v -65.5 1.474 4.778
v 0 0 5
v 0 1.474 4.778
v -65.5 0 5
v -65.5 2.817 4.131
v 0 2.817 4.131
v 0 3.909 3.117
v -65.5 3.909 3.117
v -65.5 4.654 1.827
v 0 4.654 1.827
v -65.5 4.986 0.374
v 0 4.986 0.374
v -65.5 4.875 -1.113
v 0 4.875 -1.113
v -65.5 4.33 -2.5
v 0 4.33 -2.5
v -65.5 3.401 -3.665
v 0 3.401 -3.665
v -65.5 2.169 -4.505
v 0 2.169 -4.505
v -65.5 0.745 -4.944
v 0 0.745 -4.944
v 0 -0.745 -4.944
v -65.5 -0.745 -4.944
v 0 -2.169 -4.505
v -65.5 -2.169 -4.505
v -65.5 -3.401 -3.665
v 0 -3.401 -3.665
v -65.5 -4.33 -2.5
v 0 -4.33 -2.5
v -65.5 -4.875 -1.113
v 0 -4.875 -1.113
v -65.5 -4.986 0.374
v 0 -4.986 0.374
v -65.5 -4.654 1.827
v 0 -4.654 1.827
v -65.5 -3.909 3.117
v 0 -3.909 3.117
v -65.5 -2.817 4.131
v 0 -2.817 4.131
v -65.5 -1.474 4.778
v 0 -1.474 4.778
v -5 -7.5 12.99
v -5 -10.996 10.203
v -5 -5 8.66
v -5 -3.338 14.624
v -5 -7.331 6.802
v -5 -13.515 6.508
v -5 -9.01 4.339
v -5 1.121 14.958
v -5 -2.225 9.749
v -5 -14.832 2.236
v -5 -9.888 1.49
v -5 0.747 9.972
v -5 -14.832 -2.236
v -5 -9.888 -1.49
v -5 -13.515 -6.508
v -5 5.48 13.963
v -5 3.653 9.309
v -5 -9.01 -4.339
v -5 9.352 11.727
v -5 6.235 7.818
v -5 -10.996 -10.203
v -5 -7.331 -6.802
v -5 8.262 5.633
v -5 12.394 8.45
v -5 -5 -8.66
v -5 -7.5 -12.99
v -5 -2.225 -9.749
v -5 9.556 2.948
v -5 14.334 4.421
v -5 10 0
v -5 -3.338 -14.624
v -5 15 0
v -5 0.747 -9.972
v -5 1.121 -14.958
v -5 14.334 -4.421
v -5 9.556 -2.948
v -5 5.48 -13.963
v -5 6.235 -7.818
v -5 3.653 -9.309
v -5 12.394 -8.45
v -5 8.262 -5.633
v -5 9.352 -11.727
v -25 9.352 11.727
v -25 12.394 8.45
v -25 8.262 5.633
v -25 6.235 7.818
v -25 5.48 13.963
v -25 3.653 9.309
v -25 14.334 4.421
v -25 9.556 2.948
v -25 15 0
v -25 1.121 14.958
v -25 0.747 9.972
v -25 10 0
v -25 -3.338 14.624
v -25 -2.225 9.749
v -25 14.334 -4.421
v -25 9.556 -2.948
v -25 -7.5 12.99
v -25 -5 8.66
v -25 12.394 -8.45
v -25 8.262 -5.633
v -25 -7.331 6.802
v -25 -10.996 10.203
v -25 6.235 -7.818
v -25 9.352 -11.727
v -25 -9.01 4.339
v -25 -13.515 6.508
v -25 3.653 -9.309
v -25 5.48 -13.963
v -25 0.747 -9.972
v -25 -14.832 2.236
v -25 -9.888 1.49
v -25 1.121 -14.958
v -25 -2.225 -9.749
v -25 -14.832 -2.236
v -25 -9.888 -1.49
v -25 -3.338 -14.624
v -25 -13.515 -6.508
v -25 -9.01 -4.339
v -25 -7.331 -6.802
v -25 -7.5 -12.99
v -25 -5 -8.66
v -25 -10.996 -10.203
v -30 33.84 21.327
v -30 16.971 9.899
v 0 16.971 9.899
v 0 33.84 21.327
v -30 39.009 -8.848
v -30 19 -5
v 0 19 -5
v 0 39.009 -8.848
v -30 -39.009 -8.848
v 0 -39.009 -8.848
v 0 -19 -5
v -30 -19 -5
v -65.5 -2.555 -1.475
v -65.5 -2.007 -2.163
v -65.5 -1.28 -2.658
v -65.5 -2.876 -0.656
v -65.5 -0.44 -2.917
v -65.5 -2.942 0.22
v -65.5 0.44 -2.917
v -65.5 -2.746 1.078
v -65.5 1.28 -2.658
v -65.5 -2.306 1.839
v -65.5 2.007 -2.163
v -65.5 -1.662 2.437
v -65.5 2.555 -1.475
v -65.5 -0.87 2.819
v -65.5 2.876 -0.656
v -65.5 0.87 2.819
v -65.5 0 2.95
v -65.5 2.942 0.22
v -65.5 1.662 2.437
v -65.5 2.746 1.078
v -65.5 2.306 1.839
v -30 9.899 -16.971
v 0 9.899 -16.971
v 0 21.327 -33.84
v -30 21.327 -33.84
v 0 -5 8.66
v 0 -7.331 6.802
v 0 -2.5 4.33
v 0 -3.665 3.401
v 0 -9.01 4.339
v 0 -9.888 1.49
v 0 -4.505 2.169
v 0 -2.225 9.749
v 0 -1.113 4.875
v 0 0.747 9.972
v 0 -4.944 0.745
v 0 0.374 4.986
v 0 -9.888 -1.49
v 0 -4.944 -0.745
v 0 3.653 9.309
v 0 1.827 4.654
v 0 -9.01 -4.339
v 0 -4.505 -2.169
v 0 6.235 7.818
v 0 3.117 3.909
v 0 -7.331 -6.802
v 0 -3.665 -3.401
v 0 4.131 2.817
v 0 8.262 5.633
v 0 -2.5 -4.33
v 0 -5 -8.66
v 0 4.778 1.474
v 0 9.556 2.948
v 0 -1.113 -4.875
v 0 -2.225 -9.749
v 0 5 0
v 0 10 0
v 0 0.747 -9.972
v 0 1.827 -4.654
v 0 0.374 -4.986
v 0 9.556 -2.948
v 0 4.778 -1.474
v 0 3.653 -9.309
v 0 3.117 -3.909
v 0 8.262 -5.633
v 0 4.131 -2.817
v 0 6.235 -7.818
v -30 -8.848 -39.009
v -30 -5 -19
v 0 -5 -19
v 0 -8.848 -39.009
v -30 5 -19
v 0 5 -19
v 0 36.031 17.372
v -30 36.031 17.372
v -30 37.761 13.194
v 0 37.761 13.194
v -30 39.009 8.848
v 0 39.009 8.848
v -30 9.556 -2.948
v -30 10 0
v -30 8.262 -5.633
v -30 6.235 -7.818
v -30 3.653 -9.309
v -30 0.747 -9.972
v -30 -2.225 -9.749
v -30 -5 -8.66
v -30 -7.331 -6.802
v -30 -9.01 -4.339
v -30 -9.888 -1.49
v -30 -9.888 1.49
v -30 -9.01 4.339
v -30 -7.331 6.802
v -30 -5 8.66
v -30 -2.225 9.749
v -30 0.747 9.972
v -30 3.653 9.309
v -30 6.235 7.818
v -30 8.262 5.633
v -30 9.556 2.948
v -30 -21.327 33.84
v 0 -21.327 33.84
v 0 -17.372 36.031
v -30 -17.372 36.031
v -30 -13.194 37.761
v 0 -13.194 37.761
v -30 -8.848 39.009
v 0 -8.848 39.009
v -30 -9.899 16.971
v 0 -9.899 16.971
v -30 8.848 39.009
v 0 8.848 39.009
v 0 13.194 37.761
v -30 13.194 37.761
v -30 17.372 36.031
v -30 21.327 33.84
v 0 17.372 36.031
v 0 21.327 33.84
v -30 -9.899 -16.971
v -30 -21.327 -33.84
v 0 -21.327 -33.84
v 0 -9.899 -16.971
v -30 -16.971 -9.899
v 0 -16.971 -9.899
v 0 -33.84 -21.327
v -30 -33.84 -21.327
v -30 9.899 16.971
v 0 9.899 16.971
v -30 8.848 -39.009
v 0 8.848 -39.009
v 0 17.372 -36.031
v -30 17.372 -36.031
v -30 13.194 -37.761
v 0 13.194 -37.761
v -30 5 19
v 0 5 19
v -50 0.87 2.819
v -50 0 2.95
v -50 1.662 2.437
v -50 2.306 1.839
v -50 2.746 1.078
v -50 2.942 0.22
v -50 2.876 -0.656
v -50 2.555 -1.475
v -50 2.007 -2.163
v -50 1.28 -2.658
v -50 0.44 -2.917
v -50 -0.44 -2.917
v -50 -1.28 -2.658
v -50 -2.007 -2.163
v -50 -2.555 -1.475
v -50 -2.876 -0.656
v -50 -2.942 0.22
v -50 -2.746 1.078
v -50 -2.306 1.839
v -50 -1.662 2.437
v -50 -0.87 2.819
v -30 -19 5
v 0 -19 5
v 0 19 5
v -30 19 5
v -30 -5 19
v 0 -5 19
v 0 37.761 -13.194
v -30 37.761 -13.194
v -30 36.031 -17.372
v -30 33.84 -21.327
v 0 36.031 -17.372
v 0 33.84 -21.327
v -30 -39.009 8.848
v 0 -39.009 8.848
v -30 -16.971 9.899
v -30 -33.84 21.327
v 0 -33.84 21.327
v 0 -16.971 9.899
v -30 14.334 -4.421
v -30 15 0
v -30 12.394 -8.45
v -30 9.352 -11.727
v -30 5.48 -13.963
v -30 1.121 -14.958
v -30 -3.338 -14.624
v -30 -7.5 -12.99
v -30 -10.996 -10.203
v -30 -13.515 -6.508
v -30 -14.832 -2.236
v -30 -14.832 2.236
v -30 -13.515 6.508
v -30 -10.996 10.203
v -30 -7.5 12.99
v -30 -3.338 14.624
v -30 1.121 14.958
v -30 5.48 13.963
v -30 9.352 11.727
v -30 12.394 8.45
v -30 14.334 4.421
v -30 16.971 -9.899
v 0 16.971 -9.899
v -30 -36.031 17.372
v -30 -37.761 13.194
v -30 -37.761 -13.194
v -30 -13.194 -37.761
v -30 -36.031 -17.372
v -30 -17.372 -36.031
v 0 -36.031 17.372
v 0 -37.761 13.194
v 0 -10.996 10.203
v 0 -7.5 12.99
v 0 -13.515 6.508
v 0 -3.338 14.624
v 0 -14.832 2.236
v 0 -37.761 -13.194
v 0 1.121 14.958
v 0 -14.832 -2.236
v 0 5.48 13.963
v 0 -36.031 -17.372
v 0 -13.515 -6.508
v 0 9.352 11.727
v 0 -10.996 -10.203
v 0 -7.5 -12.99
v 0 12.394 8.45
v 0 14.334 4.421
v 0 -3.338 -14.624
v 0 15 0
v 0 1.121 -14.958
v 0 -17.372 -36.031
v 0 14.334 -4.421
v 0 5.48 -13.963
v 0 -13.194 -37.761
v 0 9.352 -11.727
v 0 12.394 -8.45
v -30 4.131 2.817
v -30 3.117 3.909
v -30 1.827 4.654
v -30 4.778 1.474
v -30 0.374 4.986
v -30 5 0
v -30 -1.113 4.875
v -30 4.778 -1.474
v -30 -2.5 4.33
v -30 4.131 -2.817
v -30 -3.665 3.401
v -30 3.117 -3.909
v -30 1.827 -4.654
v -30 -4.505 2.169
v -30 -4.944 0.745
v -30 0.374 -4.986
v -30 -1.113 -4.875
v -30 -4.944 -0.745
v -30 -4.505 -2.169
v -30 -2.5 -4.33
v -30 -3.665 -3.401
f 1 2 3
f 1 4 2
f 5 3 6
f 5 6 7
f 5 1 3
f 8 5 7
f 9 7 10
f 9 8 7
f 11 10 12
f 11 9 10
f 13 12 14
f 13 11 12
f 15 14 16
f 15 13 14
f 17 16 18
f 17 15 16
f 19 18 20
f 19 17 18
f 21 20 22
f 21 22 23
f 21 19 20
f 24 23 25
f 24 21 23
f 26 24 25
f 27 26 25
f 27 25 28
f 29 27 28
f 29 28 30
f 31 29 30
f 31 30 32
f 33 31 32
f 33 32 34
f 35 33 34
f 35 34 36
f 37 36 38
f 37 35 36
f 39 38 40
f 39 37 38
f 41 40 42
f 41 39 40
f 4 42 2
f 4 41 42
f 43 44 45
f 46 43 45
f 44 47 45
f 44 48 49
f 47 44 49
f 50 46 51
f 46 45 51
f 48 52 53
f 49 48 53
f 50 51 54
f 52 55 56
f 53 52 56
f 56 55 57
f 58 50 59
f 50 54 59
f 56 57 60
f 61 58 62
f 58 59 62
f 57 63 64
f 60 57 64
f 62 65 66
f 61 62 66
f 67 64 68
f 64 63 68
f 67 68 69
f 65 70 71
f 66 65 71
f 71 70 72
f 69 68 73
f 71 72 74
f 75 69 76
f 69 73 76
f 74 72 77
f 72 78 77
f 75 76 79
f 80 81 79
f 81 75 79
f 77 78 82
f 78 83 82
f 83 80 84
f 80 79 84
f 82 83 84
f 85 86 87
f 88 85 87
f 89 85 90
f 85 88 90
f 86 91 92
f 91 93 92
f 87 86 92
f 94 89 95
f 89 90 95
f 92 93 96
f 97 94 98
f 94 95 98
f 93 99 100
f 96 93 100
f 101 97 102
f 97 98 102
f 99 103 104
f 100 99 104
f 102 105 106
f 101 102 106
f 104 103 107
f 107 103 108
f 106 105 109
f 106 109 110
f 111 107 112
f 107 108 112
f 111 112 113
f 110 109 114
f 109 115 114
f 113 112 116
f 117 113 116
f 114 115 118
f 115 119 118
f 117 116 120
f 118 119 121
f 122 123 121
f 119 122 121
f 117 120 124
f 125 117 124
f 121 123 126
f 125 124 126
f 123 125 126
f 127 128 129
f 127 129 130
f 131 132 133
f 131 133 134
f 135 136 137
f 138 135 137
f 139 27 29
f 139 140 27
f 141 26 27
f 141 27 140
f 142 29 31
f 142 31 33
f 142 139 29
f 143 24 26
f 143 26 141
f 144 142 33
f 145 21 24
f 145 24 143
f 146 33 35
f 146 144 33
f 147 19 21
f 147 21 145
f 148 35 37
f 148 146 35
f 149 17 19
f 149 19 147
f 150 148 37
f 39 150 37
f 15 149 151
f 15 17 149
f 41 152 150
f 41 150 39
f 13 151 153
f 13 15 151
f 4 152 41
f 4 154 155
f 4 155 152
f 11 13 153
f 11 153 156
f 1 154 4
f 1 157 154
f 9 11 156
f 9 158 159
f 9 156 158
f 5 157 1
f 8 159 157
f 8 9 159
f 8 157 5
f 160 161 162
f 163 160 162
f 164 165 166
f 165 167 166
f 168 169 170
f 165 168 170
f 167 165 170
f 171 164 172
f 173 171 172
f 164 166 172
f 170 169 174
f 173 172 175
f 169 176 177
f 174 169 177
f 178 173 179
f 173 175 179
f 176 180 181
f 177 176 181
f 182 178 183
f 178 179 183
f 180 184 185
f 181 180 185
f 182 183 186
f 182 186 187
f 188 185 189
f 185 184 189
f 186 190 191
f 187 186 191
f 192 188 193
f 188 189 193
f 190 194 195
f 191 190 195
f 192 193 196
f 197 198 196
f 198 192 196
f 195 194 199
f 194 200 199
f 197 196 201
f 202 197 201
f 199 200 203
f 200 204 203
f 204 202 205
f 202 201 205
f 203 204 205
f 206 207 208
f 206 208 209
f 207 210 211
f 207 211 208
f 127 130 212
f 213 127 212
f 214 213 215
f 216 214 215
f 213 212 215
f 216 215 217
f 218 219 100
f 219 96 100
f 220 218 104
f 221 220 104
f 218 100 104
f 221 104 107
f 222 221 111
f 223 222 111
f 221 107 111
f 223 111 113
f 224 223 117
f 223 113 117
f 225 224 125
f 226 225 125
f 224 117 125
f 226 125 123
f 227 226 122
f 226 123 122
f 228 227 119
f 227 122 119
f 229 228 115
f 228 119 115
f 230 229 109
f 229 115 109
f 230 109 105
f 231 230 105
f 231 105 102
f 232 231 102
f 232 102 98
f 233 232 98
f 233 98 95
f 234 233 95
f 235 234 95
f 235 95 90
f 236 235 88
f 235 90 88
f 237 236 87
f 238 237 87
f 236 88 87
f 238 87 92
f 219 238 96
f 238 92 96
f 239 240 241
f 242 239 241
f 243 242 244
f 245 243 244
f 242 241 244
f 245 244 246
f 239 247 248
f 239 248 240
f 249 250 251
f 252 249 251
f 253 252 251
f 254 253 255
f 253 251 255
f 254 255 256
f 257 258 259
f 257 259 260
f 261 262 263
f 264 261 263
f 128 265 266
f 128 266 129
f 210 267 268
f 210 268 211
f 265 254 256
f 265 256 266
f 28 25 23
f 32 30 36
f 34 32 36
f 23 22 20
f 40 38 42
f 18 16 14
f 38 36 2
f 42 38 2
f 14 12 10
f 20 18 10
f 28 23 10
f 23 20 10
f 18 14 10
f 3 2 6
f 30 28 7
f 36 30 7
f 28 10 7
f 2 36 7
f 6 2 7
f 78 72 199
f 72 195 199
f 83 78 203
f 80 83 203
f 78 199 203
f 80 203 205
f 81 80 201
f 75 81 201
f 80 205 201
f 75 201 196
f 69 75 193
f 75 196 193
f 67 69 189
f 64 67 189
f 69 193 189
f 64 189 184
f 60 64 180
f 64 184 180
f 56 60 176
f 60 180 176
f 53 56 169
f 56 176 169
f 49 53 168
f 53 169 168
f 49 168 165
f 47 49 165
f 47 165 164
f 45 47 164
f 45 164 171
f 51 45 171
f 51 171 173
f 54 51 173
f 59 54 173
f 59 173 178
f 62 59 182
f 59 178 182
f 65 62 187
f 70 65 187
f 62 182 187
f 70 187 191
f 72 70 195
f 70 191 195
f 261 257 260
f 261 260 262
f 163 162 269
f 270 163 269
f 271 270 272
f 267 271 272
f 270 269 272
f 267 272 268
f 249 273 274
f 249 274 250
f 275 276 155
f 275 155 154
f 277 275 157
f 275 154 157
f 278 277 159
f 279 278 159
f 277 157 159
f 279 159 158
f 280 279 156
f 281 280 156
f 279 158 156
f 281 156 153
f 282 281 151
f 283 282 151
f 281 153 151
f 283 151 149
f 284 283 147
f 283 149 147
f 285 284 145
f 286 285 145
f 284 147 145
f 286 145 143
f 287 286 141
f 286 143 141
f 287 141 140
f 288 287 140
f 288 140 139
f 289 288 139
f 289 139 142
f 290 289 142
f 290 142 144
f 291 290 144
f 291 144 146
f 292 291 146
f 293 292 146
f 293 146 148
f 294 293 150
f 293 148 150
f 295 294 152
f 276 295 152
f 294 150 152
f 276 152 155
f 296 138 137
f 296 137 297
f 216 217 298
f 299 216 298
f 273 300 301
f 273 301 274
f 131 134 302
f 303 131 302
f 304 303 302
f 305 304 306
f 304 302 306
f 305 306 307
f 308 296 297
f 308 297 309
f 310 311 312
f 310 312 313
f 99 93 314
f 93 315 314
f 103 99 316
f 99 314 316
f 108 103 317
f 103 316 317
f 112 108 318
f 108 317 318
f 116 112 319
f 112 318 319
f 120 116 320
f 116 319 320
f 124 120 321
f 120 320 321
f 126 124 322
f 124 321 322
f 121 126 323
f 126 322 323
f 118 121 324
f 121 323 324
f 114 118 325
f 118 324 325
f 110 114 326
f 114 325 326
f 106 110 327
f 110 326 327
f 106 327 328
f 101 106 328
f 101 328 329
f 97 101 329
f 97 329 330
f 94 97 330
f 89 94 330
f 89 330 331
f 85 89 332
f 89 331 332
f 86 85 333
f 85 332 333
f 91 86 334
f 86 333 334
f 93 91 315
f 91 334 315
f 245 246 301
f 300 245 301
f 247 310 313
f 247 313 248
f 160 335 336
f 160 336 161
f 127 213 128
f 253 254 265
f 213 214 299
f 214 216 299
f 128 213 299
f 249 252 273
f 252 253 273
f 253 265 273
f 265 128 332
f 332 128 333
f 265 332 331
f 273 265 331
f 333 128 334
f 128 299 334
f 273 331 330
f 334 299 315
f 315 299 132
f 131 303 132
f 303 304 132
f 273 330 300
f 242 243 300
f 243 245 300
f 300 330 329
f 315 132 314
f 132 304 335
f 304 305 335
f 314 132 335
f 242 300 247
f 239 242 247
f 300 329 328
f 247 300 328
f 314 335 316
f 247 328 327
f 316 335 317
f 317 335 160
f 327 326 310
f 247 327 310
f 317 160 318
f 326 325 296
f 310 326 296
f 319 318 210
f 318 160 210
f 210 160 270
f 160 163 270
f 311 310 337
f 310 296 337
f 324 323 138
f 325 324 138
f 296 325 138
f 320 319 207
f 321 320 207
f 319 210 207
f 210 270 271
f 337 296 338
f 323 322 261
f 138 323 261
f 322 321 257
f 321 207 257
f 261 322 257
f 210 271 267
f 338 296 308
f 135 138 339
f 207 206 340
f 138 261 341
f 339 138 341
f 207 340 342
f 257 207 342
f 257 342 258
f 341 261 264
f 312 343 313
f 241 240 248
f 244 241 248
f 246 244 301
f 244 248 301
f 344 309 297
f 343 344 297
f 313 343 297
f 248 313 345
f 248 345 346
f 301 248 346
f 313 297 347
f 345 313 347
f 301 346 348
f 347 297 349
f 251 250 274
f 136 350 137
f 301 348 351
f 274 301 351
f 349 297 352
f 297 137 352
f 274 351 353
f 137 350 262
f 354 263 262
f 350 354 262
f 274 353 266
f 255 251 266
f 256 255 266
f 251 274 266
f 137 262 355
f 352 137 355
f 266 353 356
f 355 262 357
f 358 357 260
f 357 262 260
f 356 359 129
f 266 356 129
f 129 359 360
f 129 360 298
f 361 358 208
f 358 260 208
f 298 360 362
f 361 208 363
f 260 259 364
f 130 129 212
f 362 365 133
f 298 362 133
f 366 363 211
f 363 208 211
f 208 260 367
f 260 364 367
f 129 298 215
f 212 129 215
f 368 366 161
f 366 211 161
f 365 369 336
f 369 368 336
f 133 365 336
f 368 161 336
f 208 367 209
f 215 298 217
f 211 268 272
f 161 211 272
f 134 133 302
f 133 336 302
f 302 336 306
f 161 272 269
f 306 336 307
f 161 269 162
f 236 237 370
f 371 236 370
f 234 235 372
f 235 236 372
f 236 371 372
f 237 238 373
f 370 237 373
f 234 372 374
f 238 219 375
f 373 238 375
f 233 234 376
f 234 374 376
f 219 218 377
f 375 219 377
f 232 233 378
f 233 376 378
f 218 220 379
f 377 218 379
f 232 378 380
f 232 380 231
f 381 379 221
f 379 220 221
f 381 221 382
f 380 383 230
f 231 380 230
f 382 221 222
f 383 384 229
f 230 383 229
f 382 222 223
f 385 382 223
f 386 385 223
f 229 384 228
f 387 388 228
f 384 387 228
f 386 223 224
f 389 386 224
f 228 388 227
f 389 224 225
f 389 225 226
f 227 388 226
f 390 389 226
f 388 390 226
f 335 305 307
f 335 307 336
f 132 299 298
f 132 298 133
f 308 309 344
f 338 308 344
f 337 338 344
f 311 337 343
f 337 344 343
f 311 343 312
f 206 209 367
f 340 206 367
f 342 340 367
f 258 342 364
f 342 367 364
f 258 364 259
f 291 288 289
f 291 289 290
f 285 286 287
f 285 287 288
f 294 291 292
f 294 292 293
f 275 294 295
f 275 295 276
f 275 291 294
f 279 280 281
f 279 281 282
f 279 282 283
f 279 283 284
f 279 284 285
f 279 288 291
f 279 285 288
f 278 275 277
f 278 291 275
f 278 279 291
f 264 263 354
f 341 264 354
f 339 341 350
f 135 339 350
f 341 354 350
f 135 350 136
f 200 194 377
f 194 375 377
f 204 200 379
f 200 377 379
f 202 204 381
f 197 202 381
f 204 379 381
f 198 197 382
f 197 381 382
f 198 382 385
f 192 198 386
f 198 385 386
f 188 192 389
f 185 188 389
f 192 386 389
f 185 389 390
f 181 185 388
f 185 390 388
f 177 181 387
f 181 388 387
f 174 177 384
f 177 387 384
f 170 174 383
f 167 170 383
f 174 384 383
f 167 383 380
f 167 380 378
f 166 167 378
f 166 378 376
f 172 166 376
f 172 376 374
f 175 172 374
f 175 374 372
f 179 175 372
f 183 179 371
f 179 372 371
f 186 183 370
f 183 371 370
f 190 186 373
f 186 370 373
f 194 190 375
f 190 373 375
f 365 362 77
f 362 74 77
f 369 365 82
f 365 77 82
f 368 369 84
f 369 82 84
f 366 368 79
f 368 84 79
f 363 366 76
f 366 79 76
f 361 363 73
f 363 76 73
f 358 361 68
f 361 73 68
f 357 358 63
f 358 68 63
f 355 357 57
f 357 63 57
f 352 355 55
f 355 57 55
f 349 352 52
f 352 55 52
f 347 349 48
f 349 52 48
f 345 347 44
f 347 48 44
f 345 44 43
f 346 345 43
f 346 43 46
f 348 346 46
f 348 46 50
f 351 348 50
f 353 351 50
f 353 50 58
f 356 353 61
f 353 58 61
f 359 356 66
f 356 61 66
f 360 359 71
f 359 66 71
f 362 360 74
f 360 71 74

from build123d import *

# Parameters (mm, degrees)
CUT_EXTRUDE6_DEPTH       = 31
CIRPATTERN6_COUNT        = 8
SKETCH9_R                = 5
BOSS_EXTRUDE1_DEPTH      = 35.5
BOSS_EXTRUDE1_DEPTH_BACK = 30
SKETCH11_R               = 2.95
CUT_EXTRUDE7_DEPTH       = 15.5


with BuildPart() as part:
    # Sketch2 → Revolve1 (revolve)
    with BuildSketch(Plane.XY):
        Polygon((0, 5), (-30, 5), (-30, 10), (-25, 10), (-25, 15), (-30, 15), (-30, 40), (0, 40), (0, 15), (-5, 15), (-5, 10), (0, 10), align=None)
    revolve(axis=Axis((0, 0, 0), (-1, 0, 0)))

    # Sketch8 → Cut-Extrude6 (cut, through all)
    with BuildSketch(Plane.ZY.offset(30)):
        Polygon((-10, 45), (10, 45), (5, 19), (-5, 19), align=None)
    cut_extrude6 = extrude(amount=-CUT_EXTRUDE6_DEPTH, mode=Mode.SUBTRACT)

    # CirPattern6: Cut-Extrude6 ×8 about axis
    cirpattern6_axis = Axis((0, 0, 0), (1, 0, 0))
    for i in range(1, CIRPATTERN6_COUNT):
        add(cut_extrude6.rotate(cirpattern6_axis, i * 360 / CIRPATTERN6_COUNT), mode=Mode.SUBTRACT)


with BuildPart() as body_2:
    # Sketch9 → Boss-Extrude1 (new body, two sides)
    with BuildSketch(Plane.ZY.offset(30)) as boss_extrude1_sk:
        Circle(SKETCH9_R)
    extrude(amount=BOSS_EXTRUDE1_DEPTH)
    extrude(boss_extrude1_sk.sketch, amount=-BOSS_EXTRUDE1_DEPTH_BACK)

    # Sketch11 → Cut-Extrude7 (cut)
    with BuildSketch(Plane.ZY.offset(65.5)):
        Circle(SKETCH11_R)
    extrude(amount=-CUT_EXTRUDE7_DEPTH, mode=Mode.SUBTRACT)


solid = Compound([part.part, body_2.part])
